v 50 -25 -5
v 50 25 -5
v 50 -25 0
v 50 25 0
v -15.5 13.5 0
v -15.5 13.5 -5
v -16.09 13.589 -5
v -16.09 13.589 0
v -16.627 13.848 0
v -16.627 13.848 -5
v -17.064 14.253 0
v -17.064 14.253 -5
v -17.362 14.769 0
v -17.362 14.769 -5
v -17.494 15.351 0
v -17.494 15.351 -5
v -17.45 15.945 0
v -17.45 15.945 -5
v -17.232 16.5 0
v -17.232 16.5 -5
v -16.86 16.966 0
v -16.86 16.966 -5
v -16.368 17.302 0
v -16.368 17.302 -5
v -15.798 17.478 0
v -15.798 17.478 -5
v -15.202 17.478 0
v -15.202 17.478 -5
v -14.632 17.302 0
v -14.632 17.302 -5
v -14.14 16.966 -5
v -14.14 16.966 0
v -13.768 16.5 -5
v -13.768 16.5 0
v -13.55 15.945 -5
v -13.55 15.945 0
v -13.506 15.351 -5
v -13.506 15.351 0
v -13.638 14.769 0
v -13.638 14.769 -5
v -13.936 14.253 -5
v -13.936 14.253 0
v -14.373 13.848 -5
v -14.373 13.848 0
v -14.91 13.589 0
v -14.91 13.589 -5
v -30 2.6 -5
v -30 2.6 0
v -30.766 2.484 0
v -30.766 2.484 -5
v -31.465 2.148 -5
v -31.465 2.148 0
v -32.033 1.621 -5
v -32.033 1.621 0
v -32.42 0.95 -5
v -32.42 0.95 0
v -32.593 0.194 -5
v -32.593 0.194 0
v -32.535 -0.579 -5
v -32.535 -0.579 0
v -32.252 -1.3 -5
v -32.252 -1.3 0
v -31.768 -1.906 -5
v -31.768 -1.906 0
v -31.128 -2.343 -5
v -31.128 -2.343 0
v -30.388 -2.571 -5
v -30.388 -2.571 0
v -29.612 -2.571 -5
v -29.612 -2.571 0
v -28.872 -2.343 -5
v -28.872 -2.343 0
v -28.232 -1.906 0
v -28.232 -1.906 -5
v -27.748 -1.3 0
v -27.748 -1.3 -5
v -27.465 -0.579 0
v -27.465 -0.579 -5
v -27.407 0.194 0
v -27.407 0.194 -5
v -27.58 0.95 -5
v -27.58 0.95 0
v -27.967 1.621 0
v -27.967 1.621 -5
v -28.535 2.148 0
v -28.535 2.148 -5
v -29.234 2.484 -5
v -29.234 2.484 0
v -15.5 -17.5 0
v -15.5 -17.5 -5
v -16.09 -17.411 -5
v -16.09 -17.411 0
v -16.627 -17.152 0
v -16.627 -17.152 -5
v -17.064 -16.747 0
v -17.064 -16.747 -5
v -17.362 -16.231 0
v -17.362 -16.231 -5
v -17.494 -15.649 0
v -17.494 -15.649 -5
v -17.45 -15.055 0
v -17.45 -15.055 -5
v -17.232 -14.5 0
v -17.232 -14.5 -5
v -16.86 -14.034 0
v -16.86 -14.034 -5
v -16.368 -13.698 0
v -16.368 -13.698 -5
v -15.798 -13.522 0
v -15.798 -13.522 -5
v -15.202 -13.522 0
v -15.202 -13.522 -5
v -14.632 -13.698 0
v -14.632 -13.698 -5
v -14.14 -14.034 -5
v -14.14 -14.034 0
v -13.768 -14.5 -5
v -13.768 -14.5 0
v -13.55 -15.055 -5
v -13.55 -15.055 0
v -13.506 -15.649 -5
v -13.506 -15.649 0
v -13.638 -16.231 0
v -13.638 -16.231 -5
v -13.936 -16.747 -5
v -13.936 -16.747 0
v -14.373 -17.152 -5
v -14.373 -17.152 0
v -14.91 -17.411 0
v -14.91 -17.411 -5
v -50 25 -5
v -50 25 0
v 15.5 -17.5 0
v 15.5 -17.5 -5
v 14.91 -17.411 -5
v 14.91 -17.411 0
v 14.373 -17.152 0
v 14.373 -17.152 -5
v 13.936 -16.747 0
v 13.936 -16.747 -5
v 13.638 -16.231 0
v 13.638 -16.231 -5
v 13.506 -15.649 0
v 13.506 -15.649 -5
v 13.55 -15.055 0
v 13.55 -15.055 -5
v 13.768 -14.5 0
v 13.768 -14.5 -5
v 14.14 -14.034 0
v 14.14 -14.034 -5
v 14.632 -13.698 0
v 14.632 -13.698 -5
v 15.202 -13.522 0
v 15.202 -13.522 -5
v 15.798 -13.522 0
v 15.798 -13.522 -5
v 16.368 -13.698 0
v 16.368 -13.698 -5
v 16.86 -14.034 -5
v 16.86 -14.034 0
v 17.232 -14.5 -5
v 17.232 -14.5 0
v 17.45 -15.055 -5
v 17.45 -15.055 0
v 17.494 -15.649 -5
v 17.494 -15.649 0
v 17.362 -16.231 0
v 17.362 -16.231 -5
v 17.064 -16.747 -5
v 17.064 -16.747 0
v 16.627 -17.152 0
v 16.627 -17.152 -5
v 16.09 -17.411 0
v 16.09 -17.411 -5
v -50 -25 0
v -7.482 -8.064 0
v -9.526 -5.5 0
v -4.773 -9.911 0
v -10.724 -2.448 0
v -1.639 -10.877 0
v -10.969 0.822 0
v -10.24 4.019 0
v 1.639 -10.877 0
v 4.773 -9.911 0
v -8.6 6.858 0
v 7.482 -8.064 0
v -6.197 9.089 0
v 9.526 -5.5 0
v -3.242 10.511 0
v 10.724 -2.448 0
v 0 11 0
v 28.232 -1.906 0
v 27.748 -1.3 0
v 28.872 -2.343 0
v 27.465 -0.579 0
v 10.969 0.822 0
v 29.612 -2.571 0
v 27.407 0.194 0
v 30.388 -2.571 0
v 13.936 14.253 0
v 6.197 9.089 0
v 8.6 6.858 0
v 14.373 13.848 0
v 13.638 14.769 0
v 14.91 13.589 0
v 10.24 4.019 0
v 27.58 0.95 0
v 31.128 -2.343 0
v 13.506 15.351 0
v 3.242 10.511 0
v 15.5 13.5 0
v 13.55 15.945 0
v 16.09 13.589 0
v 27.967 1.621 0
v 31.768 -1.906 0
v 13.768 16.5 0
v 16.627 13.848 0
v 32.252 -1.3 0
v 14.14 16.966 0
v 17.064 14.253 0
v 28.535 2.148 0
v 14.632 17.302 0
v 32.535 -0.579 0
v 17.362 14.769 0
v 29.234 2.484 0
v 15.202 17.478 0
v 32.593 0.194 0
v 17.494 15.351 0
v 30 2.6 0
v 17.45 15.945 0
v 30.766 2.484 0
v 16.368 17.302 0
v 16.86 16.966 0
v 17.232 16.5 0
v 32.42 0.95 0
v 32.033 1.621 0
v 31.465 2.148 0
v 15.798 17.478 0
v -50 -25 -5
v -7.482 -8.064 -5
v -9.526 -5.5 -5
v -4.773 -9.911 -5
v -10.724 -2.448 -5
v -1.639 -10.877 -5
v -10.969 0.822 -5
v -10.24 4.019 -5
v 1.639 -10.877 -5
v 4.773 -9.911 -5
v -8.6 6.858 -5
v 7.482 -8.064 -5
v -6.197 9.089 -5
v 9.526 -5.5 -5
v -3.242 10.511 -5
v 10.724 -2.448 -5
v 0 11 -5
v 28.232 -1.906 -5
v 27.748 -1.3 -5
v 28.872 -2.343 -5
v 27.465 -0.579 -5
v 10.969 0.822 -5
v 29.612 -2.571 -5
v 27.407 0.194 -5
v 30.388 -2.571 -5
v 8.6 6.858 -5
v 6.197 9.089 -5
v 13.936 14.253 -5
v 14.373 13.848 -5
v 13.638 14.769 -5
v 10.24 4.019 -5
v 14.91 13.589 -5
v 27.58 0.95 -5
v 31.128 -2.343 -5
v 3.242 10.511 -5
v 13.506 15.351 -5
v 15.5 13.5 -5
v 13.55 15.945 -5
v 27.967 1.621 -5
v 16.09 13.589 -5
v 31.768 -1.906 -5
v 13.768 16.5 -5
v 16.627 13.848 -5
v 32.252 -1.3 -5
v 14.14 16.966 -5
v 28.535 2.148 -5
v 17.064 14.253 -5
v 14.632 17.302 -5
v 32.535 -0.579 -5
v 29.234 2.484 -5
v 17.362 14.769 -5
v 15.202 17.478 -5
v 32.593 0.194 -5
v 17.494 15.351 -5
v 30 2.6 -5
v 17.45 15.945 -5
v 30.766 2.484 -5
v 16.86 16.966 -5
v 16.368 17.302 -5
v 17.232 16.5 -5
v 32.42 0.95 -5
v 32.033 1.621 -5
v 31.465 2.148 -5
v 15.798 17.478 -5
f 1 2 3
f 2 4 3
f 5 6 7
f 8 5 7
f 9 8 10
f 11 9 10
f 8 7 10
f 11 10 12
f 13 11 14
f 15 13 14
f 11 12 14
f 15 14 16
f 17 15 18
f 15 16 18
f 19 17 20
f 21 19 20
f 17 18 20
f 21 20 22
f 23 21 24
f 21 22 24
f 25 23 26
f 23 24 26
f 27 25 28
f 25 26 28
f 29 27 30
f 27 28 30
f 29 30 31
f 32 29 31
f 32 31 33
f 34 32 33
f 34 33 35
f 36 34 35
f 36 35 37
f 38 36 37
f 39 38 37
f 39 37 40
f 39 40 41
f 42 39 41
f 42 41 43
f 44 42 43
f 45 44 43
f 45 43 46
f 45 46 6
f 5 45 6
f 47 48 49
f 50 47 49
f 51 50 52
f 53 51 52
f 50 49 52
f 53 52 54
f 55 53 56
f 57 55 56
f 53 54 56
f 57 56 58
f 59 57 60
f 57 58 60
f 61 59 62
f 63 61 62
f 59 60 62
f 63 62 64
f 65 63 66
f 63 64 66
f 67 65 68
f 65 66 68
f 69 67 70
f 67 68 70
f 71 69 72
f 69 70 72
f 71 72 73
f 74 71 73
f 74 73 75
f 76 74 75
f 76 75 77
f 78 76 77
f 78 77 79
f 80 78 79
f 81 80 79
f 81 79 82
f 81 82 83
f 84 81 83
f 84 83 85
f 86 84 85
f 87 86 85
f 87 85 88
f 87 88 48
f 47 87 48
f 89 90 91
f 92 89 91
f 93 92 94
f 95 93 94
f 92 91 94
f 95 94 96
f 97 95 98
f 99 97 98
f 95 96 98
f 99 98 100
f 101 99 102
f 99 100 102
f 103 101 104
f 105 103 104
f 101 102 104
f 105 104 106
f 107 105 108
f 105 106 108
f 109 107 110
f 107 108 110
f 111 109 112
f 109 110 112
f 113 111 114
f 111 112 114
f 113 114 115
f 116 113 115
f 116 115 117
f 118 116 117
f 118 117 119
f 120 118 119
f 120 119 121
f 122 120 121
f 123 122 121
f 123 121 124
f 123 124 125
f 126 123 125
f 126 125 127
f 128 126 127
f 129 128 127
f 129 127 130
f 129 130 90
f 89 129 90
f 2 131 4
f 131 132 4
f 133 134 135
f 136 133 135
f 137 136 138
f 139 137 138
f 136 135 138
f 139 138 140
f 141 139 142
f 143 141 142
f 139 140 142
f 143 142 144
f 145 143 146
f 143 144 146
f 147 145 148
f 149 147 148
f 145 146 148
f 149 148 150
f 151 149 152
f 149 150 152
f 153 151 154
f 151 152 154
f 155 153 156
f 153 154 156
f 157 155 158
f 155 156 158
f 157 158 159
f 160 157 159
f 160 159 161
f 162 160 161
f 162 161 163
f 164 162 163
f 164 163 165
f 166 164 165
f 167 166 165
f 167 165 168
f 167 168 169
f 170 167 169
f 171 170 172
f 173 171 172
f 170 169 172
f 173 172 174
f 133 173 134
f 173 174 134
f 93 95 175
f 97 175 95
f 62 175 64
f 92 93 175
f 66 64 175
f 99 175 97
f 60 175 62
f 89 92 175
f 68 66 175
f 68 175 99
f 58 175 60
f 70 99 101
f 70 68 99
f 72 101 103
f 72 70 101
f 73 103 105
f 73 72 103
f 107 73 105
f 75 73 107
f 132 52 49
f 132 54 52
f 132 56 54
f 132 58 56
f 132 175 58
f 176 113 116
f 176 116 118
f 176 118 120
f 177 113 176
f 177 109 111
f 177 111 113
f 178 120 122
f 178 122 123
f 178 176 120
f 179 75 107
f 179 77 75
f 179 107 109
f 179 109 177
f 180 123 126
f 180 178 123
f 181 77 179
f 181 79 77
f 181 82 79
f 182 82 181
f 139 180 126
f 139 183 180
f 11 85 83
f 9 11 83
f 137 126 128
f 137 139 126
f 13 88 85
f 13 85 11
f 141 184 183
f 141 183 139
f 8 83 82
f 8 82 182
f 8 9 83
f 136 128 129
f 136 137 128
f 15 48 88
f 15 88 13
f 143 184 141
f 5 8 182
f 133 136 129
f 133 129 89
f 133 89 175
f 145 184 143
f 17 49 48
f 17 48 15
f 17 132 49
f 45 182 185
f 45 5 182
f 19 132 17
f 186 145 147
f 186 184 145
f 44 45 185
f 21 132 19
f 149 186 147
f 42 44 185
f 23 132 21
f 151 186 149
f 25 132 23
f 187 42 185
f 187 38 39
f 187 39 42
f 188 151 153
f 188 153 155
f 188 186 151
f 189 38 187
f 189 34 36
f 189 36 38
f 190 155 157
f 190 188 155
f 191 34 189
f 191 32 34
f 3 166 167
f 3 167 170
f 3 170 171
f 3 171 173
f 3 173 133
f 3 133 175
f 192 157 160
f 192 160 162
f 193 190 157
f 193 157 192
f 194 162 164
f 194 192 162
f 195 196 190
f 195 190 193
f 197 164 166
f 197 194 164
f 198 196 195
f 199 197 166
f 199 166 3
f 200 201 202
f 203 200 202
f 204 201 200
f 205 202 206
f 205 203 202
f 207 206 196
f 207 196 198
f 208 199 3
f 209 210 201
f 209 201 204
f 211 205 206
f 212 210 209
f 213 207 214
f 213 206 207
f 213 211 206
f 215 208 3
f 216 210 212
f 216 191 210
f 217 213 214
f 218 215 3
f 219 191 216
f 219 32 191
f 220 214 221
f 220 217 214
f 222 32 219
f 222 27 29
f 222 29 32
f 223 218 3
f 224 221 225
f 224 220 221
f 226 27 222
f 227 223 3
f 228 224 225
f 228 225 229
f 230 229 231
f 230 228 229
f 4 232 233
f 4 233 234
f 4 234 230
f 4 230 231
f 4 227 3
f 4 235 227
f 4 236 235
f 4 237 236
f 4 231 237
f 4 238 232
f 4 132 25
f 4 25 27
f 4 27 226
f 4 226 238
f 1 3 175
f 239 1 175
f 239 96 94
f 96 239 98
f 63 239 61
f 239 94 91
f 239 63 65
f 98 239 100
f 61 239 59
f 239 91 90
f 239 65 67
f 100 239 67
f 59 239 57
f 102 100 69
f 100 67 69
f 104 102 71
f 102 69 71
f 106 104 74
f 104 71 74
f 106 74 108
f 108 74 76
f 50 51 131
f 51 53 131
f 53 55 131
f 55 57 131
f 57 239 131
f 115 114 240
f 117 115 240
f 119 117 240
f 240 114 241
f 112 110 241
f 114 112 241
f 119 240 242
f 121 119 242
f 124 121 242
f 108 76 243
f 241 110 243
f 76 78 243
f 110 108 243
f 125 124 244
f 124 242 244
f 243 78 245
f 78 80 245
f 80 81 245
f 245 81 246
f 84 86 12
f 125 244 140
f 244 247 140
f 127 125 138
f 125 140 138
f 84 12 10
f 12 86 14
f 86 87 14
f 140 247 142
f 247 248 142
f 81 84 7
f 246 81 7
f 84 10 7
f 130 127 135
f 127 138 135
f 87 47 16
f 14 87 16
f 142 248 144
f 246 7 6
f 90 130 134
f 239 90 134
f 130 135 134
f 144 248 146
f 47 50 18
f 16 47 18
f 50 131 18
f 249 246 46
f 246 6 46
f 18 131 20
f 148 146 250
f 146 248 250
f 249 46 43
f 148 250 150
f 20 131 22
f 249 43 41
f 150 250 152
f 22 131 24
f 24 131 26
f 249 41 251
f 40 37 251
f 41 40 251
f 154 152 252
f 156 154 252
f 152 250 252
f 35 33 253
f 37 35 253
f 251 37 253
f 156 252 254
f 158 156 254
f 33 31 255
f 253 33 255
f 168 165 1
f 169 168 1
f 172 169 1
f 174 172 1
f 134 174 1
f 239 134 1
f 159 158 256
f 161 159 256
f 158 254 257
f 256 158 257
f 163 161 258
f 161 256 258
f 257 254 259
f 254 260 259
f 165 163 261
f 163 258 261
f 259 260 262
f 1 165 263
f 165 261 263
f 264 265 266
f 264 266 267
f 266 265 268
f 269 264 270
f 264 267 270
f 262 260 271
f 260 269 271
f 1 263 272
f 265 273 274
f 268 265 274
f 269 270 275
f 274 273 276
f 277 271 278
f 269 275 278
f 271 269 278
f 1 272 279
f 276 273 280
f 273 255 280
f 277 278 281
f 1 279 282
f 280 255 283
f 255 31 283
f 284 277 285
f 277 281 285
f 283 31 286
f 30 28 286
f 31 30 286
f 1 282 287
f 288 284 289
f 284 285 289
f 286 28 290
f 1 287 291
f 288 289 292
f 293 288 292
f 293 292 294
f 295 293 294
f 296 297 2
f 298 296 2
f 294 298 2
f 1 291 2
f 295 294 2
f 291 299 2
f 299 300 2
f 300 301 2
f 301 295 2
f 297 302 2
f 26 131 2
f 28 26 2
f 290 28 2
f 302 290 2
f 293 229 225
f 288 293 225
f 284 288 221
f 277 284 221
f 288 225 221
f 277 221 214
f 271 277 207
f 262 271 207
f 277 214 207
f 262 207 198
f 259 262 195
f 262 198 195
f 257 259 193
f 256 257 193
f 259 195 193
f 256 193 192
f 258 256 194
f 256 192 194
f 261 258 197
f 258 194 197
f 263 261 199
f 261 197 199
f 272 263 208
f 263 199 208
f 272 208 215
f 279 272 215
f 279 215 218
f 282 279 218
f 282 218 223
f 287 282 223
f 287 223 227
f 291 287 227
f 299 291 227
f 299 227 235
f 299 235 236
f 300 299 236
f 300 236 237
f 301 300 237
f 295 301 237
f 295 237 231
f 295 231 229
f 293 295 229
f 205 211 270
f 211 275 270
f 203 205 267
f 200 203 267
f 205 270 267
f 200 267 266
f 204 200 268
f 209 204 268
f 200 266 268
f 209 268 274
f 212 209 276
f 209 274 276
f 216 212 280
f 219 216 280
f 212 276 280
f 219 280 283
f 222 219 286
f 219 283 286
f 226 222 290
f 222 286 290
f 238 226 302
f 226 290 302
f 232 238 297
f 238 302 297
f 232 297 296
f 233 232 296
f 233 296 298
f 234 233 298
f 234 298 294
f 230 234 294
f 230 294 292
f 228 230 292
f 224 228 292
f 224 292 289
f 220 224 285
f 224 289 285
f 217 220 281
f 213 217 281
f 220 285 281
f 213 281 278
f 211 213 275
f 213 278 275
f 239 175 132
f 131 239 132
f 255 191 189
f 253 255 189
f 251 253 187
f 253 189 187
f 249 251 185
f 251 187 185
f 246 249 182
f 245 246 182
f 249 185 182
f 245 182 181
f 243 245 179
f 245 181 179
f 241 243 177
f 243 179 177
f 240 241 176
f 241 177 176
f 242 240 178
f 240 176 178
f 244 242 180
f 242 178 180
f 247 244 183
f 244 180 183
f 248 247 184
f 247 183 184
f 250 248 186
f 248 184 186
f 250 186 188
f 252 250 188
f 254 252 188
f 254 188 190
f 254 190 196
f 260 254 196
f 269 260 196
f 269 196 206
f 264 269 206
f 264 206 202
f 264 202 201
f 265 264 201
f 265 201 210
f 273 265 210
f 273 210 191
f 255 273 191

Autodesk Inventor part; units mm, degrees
ref_plane "YZ Plane" through (0, 0, 0) normal (1, 0, 0) x (0, 1, 0)
ref_plane "XZ Plane" through (0, 0, 0) normal (0, 1, 0) x (-1, 0, 0)
ref_plane "XY Plane" through (0, 0, 0) normal (0, 0, 1) x (1, 0, 0)
sketch "Block1" plane through (0, 0, 0) normal (0, 0, 1) x (1, 0, 0)
  line L0 (-30.1, 34.1) -> (-9.9, 34.1)
  line L1 (-9.9, 34.1) -> (-9.9, 25.1)
  line L2 (-9.9, 25.1) -> (9.9, 25.1)
  line L3 (9.9, 25.1) -> (9.9, 34.1)
  line L4 (9.9, 34.1) -> (30.1, 34.1)
  line L5 (30.1, 34.1) -> (30.1, 25.1)
  line L6 (30.1, 25.1) -> (50.1, 25.1)
  line L7 (50.1, 25.1) -> (50.1, 16.5667)
  line L8 (50.1, 16.5667) -> (41.1, 16.5667)
  line L9 (41.1, 16.5667) -> (41.1, 6.7667)
  line L10 (41.1, 6.7667) -> (50.1, 6.7667)
  line L11 (50.1, 6.7667) -> (50.1, -6.7667)
  line L12 (50.1, -6.7667) -> (41.1, -6.7667)
  line L13 (41.1, -6.7667) -> (41.1, -16.5667)
  line L14 (41.1, -16.5667) -> (50.1, -16.5667)
  line L15 (50.1, -16.5667) -> (50.1, -25.1)
  line L16 (50.1, -25.1) -> (30.1, -25.1)
  line L17 (30.1, -25.1) -> (30.1, -34.1)
  line L18 (30.1, -34.1) -> (9.9, -34.1)
  line L19 (9.9, -34.1) -> (9.9, -25.1)
  line L20 (9.9, -25.1) -> (-9.9, -25.1)
  line L21 (-9.9, -25.1) -> (-9.9, -34.1)
  line L22 (-9.9, -34.1) -> (-30.1, -34.1)
  line L23 (-30.1, -34.1) -> (-30.1, -25.1)
  line L24 (-30.1, -25.1) -> (-50.1, -25.1)
  line L25 (-50.1, -25.1) -> (-50.1, -16.5667)
  line L26 (-50.1, -16.5667) -> (-41.1, -16.5667)
  line L27 (-41.1, -16.5667) -> (-41.1, -6.7667)
  line L28 (-41.1, -6.7667) -> (-50.1, -6.7667)
  line L29 (-50.1, -6.7667) -> (-50.1, 6.7667)
  line L30 (-50.1, 6.7667) -> (-41.1, 6.7667)
  line L31 (-41.1, 6.7667) -> (-41.1, 16.5667)
  line L32 (-41.1, 16.5667) -> (-50.1, 16.5667)
  line L33 (-50.1, 16.5667) -> (-50.1, 25.1)
  line L34 (-50.1, 25.1) -> (-30.1, 25.1)
  line L35 (-30.1, 25.1) -> (-30.1, 34.1)
  circle A0 centre (-30, 0) radius 4.6
  circle A1 centre (-15.5, 15.5) radius 2.1
  circle A2 centre (-15.5, -15.5) radius 2.1
  circle A3 centre (0, 0) radius 11.1
  circle A4 centre (15.5, 15.5) radius 2.1
  circle A5 centre (30, 0) radius 4.6
  circle A6 centre (15.5, -15.5) radius 2.1
  point P0 (0, 0)
sketch "Block2" plane through (0, 0, 0) normal (0, 0, 1) x (1, 0, 0)
  line L0 (9.8, 34.2) -> (30.2, 34.2)
  line L1 (30.2, 34.2) -> (30.2, 25.2)
  line L2 (30.2, 25.2) -> (50.2, 25.2)
  line L3 (50.2, 25.2) -> (50.2, 16.4667)
  line L4 (50.2, 16.4667) -> (41.2, 16.4667)
  line L5 (41.2, 16.4667) -> (41.2, 6.8667)
  line L6 (41.2, 6.8667) -> (50.2, 6.8667)
  line L7 (50.2, 6.8667) -> (50.2, -6.8667)
  line L8 (50.2, -6.8667) -> (41.2, -6.8667)
  line L9 (41.2, -6.8667) -> (41.2, -16.4667)
  line L10 (41.2, -16.4667) -> (50.2, -16.4667)
  line L11 (50.2, -16.4667) -> (50.2, -25.2)
  line L12 (50.2, -25.2) -> (30.2, -25.2)
  line L13 (30.2, -25.2) -> (30.2, -34.2)
  line L14 (30.2, -34.2) -> (9.8, -34.2)
  line L15 (9.8, -34.2) -> (9.8, -25.2)
  line L16 (9.8, -25.2) -> (-9.8, -25.2)
  line L17 (-9.8, -25.2) -> (-9.8, -34.2)
  line L18 (-9.8, -34.2) -> (-30.2, -34.2)
  line L19 (-30.2, -34.2) -> (-30.2, -25.2)
  line L20 (-30.2, -25.2) -> (-50.2, -25.2)
  line L21 (-50.2, -25.2) -> (-50.2, -16.4667)
  line L22 (-50.2, -16.4667) -> (-41.2, -16.4667)
  line L23 (-41.2, -16.4667) -> (-41.2, -6.8667)
  line L24 (-41.2, -6.8667) -> (-50.2, -6.8667)
  line L25 (-50.2, -6.8667) -> (-50.2, 6.8667)
  line L26 (-50.2, 6.8667) -> (-41.2, 6.8667)
  line L27 (-41.2, 6.8667) -> (-41.2, 16.4667)
  line L28 (-41.2, 16.4667) -> (-50.2, 16.4667)
  line L29 (-50.2, 16.4667) -> (-50.2, 25.2)
  line L30 (-50.2, 25.2) -> (-30.2, 25.2)
  line L31 (-30.2, 25.2) -> (-30.2, 34.2)
  line L32 (-30.2, 34.2) -> (-9.8, 34.2)
  line L33 (-9.8, 34.2) -> (-9.8, 25.2)
  line L34 (-9.8, 25.2) -> (9.8, 25.2)
  line L35 (9.8, 25.2) -> (9.8, 34.2)
  circle A0 centre (-15.5, 15.5) radius 2.2
  circle A1 centre (15.5, 15.5) radius 2.2
  circle A2 centre (30, 0) radius 4.7
  circle A3 centre (15.5, -15.5) radius 2.2
  circle A4 centre (-15.5, -15.5) radius 2.2
  circle A5 centre (-30, 0) radius 4.7
  circle A6 centre (0, 0) radius 11.2
  point P0 (0, 0)
sketch "Block3" plane through (0, 0, 0) normal (0, 0, 1) x (1, 0, 0)
  line L0 (9.9, 34.1) -> (30.1, 34.1)
  line L1 (30.1, 34.1) -> (30.1, 25.1)
  line L2 (30.1, 25.1) -> (50.1, 25.1)
  line L3 (50.1, 25.1) -> (50.1, 16.5667)
  line L4 (50.1, 16.5667) -> (41.1, 16.5667)
  line L5 (41.1, 16.5667) -> (41.1, 6.7667)
  line L6 (41.1, 6.7667) -> (50.1, 6.7667)
  line L7 (50.1, 6.7667) -> (50.1, -6.7667)
  line L8 (50.1, -6.7667) -> (41.1, -6.7667)
  line L9 (41.1, -6.7667) -> (41.1, -16.5667)
  line L10 (41.1, -16.5667) -> (50.1, -16.5667)
  line L11 (50.1, -16.5667) -> (50.1, -25.1)
  line L12 (50.1, -25.1) -> (30.1, -25.1)
  line L13 (30.1, -25.1) -> (30.1, -34.1)
  line L14 (30.1, -34.1) -> (9.9, -34.1)
  line L15 (9.9, -34.1) -> (9.9, -25.1)
  line L16 (9.9, -25.1) -> (-9.9, -25.1)
  line L17 (-9.9, -25.1) -> (-9.9, -34.1)
  line L18 (-9.9, -34.1) -> (-30.1, -34.1)
  line L19 (-30.1, -34.1) -> (-30.1, -25.1)
  line L20 (-30.1, -25.1) -> (-50.1, -25.1)
  line L21 (-50.1, -25.1) -> (-50.1, -16.5667)
  line L22 (-50.1, -16.5667) -> (-41.1, -16.5667)
  line L23 (-41.1, -16.5667) -> (-41.1, -6.7667)
  line L24 (-41.1, -6.7667) -> (-50.1, -6.7667)
  line L25 (-50.1, -6.7667) -> (-50.1, 6.7667)
  line L26 (-50.1, 6.7667) -> (-41.1, 6.7667)
  line L27 (-41.1, 6.7667) -> (-41.1, 16.5667)
  line L28 (-41.1, 16.5667) -> (-50.1, 16.5667)
  line L29 (-50.1, 16.5667) -> (-50.1, 25.1)
  line L30 (-50.1, 25.1) -> (-30.1, 25.1)
  line L31 (-30.1, 25.1) -> (-30.1, 34.1)
  line L32 (-30.1, 34.1) -> (-9.9, 34.1)
  line L33 (-9.9, 34.1) -> (-9.9, 25.1)
  line L34 (-9.9, 25.1) -> (9.9, 25.1)
  line L35 (9.9, 25.1) -> (9.9, 34.1)
  circle A0 centre (-15.5, 15.5) radius 2.1
  circle A1 centre (15.5, 15.5) radius 2.1
  circle A2 centre (30, 0) radius 4.6
  circle A3 centre (15.5, -15.5) radius 2.1
  circle A4 centre (-15.5, -15.5) radius 2.1
  circle A5 centre (-30, 0) radius 4.6
  circle A6 centre (0, 0) radius 11.1
  point P0 (0, 0)
sketch "Block4" plane through (0, 0, 0) normal (0, 0, 1) x (1, 0, 0)
  line L0 (-30.08, 30.58) -> (-9.92, 30.58)
  line L1 (-9.92, 30.58) -> (-9.92, 25.08)
  line L2 (-9.92, 25.08) -> (9.92, 25.08)
  line L3 (9.92, 25.08) -> (9.92, 30.58)
  line L4 (9.92, 30.58) -> (30.08, 30.58)
  line L5 (30.08, 30.58) -> (30.08, 25.08)
  line L6 (30.08, 25.08) -> (50.08, 25.08)
  line L7 (50.08, 25.08) -> (50.08, 16.5867)
  line L8 (50.08, 16.5867) -> (44.58, 16.5867)
  line L9 (44.58, 16.5867) -> (44.58, 6.7467)
  line L10 (44.58, 6.7467) -> (50.08, 6.7467)
  line L11 (50.08, 6.7467) -> (50.08, -6.7467)
  line L12 (50.08, -6.7467) -> (44.58, -6.7467)
  line L13 (44.58, -6.7467) -> (44.58, -16.5867)
  line L14 (44.58, -16.5867) -> (50.08, -16.5867)
  line L15 (50.08, -16.5867) -> (50.08, -25.08)
  line L16 (50.08, -25.08) -> (30.08, -25.08)
  line L17 (30.08, -25.08) -> (30.08, -30.58)
  line L18 (30.08, -30.58) -> (9.92, -30.58)
  line L19 (9.92, -30.58) -> (9.92, -25.08)
  line L20 (9.92, -25.08) -> (-9.92, -25.08)
  line L21 (-9.92, -25.08) -> (-9.92, -30.58)
  line L22 (-9.92, -30.58) -> (-30.08, -30.58)
  line L23 (-30.08, -30.58) -> (-30.08, -25.08)
  line L24 (-30.08, -25.08) -> (-50.08, -25.08)
  line L25 (-50.08, -25.08) -> (-50.08, -16.5867)
  line L26 (-50.08, -16.5867) -> (-44.58, -16.5867)
  line L27 (-44.58, -16.5867) -> (-44.58, -6.7467)
  line L28 (-44.58, -6.7467) -> (-50.08, -6.7467)
  line L29 (-50.08, -6.7467) -> (-50.08, 6.7467)
  line L30 (-50.08, 6.7467) -> (-44.58, 6.7467)
  line L31 (-44.58, 6.7467) -> (-44.58, 16.5867)
  line L32 (-44.58, 16.5867) -> (-50.08, 16.5867)
  line L33 (-50.08, 16.5867) -> (-50.08, 25.08)
  line L34 (-50.08, 25.08) -> (-30.08, 25.08)
  line L35 (-30.08, 25.08) -> (-30.08, 30.58)
  circle A0 centre (-30, 0) radius 4.88
  circle A1 centre (30, 0) radius 4.88
  circle A2 centre (15.5, 15.5) radius 2.08
  circle A3 centre (0, 0) radius 11.08
  circle A4 centre (-15.5, 15.5) radius 2.08
  circle A5 centre (-15.5, -15.5) radius 2.08
  circle A6 centre (15.5, -15.5) radius 2.08
  point P0 (0, 0)
sketch "Sketch10" plane through (0, 0, 0) normal (0, 0, 1) x (1, 0, 0)
  line L0 (50, -25) -> (-50, -25)
  line L1 (-50, -25) -> (-50, 25)
  line L2 (-50, 25) -> (50, 25)
  line L3 (50, 25) -> (50, -25)
  line L4 (50, -25) -> (-50, 25) construction
  line L5 (-50, -25) -> (50, 25) construction
  point P0 (0, 0)
  dimension "d21" = 100
  dimension "d22" = 50
extrude "Extrusion2" add sketch "Sketch10" against normal blind 5
sketch "Sketch13" plane through (0, 0, 0) normal (0, 0, 1) x (1, 0, 0)
  line L0 (0, -47.8822) -> (0, 48.5933) projected
  line L1 (-201.8331, 0) -> (92.0889, 0) projected
  point P0 (-15.5, 15.5)
  point P1 (15.5, 15.5)
  point P2 (-15.5, -15.5)
  point P3 (15.5, -15.5)
  dimension "d43" = 31
  dimension "d44" = 31
hole "Hole4" at (-15.5, 15.5, 0) at (15.5, 15.5, 0) at (-15.5, -15.5, 0) at (15.5, -15.5, 0) direction (0, 0, -1) diameter 4 end through all
sketch "Sketch16" plane through (0, 0, -5) normal (0, 0, -1) x (-1, 0, 0)
  line L0 (0, -47.8822) -> (0, 48.5933) projected
  point P0 (0, 0)
  point P1 (-30, 0)
  point P2 (30, 0)
  dimension "d52" = 60
hole "Hole5" at (30, 0, -5) at (-30, 0, -5) direction (0, 0, 1) diameter 5.2 end through all
sketch "Sketch17" plane through (0, 0, -5) normal (0, 0, -1) x (-1, 0, 0)
  point P0 (0, 0)
  point P1 (0, 0)
hole "Hole8" at (0, 0, -5) direction (0, 0, 1) diameter 22 end through all
sketch "Sketch33" plane through (0, 0, 0) normal (0, 0, 1) x (1, 0, 0)
  line L0 (-50, 25) -> (50, 25) projected
  line L1 (-50, -25) -> (-50, 25) projected
  line L2 (0, -47.8822) -> (0, 48.5933) projected
  line L3 (-201.8331, 0) -> (92.0889, 0) projected
  line L4 (-30, 25) -> (-10, 25)
  line L5 (-10, 25) -> (-10, 30.5)
  line L6 (-10, 30.5) -> (-30, 30.5)
  line L7 (-30, 30.5) -> (-30, 25)
  line L8 (30, 25) -> (10, 25)
  line L9 (10, 25) -> (10, 30.5)
  line L10 (10, 30.5) -> (30, 30.5)
  line L11 (30, 30.5) -> (30, 25)
  line L12 (-30, -25) -> (-10, -25)
  line L13 (-10, -25) -> (-10, -30.5)
  line L14 (-10, -30.5) -> (-30, -30.5)
  line L15 (-30, -30.5) -> (-30, -25)
  line L16 (10, -25) -> (10, -30.5)
  line L17 (30, -25) -> (10, -25)
  line L18 (10, -30.5) -> (30, -30.5)
  line L19 (30, -30.5) -> (30, -25)
  point P0 (-50, 16.6667)
  dimension "d121" = 20
  dimension "d122" = 5.5
  dimension "d123" = 20
extrude "Extrusion5" [suppressed]
sketch "Sketch34" plane through (0, 0, -5) normal (0, 0, -1) x (-1, 0, 0)
  line L0 (50, 25) -> (-50, 25) projected
  line L1 (-50, 25) -> (-50, -25) projected
  line L2 (-50, 16.6667) -> (-44.5, 16.6667)
  line L3 (-44.5, 16.6667) -> (-44.5, 6.6667)
  line L4 (-44.5, 6.6667) -> (-50, 6.6667)
  line L5 (-50, 6.6667) -> (-50, 16.6667)
  line L6 (201.8331, 0) -> (-92.0889, 0) projected
  line L7 (0, -47.8822) -> (0, 48.5933) projected
  line L8 (-50, -16.6667) -> (-44.5, -16.6667)
  line L9 (-44.5, -16.6667) -> (-44.5, -6.6667)
  line L10 (-44.5, -6.6667) -> (-50, -6.6667)
  line L11 (-50, -6.6667) -> (-50, -16.6667)
  line L12 (50, 16.6667) -> (44.5, 16.6667)
  line L13 (44.5, 16.6667) -> (44.5, 6.6667)
  line L14 (44.5, 6.6667) -> (50, 6.6667)
  line L15 (50, 6.6667) -> (50, 16.6667)
  line L16 (44.5, -16.6667) -> (44.5, -6.6667)
  line L17 (50, -16.6667) -> (44.5, -16.6667)
  line L18 (44.5, -6.6667) -> (50, -6.6667)
  line L19 (50, -6.6667) -> (50, -16.6667)
  point P0 (-30, 25)
  dimension "d131" = 5.5
  dimension "d132" = 10
  dimension "d133" = 8.3333
extrude "Extrusion6" [suppressed]
equation "\"d121\" = 0.2 * d21"
equation "\"d122\" = Wt"
equation "\"d123\" = 0.2 * d21"
equation "\"d129\" = Wt"
equation "\"d131\" = Wt"
equation "\"d132\" = 0.2 * d22"
equation "\"d133\" = 0.166667 * d22"
equation "\"d134\" = Wt"
equation "\"Wt\" = 5.5"
properties part number "holder_plate" material "Wood (Birch)"
